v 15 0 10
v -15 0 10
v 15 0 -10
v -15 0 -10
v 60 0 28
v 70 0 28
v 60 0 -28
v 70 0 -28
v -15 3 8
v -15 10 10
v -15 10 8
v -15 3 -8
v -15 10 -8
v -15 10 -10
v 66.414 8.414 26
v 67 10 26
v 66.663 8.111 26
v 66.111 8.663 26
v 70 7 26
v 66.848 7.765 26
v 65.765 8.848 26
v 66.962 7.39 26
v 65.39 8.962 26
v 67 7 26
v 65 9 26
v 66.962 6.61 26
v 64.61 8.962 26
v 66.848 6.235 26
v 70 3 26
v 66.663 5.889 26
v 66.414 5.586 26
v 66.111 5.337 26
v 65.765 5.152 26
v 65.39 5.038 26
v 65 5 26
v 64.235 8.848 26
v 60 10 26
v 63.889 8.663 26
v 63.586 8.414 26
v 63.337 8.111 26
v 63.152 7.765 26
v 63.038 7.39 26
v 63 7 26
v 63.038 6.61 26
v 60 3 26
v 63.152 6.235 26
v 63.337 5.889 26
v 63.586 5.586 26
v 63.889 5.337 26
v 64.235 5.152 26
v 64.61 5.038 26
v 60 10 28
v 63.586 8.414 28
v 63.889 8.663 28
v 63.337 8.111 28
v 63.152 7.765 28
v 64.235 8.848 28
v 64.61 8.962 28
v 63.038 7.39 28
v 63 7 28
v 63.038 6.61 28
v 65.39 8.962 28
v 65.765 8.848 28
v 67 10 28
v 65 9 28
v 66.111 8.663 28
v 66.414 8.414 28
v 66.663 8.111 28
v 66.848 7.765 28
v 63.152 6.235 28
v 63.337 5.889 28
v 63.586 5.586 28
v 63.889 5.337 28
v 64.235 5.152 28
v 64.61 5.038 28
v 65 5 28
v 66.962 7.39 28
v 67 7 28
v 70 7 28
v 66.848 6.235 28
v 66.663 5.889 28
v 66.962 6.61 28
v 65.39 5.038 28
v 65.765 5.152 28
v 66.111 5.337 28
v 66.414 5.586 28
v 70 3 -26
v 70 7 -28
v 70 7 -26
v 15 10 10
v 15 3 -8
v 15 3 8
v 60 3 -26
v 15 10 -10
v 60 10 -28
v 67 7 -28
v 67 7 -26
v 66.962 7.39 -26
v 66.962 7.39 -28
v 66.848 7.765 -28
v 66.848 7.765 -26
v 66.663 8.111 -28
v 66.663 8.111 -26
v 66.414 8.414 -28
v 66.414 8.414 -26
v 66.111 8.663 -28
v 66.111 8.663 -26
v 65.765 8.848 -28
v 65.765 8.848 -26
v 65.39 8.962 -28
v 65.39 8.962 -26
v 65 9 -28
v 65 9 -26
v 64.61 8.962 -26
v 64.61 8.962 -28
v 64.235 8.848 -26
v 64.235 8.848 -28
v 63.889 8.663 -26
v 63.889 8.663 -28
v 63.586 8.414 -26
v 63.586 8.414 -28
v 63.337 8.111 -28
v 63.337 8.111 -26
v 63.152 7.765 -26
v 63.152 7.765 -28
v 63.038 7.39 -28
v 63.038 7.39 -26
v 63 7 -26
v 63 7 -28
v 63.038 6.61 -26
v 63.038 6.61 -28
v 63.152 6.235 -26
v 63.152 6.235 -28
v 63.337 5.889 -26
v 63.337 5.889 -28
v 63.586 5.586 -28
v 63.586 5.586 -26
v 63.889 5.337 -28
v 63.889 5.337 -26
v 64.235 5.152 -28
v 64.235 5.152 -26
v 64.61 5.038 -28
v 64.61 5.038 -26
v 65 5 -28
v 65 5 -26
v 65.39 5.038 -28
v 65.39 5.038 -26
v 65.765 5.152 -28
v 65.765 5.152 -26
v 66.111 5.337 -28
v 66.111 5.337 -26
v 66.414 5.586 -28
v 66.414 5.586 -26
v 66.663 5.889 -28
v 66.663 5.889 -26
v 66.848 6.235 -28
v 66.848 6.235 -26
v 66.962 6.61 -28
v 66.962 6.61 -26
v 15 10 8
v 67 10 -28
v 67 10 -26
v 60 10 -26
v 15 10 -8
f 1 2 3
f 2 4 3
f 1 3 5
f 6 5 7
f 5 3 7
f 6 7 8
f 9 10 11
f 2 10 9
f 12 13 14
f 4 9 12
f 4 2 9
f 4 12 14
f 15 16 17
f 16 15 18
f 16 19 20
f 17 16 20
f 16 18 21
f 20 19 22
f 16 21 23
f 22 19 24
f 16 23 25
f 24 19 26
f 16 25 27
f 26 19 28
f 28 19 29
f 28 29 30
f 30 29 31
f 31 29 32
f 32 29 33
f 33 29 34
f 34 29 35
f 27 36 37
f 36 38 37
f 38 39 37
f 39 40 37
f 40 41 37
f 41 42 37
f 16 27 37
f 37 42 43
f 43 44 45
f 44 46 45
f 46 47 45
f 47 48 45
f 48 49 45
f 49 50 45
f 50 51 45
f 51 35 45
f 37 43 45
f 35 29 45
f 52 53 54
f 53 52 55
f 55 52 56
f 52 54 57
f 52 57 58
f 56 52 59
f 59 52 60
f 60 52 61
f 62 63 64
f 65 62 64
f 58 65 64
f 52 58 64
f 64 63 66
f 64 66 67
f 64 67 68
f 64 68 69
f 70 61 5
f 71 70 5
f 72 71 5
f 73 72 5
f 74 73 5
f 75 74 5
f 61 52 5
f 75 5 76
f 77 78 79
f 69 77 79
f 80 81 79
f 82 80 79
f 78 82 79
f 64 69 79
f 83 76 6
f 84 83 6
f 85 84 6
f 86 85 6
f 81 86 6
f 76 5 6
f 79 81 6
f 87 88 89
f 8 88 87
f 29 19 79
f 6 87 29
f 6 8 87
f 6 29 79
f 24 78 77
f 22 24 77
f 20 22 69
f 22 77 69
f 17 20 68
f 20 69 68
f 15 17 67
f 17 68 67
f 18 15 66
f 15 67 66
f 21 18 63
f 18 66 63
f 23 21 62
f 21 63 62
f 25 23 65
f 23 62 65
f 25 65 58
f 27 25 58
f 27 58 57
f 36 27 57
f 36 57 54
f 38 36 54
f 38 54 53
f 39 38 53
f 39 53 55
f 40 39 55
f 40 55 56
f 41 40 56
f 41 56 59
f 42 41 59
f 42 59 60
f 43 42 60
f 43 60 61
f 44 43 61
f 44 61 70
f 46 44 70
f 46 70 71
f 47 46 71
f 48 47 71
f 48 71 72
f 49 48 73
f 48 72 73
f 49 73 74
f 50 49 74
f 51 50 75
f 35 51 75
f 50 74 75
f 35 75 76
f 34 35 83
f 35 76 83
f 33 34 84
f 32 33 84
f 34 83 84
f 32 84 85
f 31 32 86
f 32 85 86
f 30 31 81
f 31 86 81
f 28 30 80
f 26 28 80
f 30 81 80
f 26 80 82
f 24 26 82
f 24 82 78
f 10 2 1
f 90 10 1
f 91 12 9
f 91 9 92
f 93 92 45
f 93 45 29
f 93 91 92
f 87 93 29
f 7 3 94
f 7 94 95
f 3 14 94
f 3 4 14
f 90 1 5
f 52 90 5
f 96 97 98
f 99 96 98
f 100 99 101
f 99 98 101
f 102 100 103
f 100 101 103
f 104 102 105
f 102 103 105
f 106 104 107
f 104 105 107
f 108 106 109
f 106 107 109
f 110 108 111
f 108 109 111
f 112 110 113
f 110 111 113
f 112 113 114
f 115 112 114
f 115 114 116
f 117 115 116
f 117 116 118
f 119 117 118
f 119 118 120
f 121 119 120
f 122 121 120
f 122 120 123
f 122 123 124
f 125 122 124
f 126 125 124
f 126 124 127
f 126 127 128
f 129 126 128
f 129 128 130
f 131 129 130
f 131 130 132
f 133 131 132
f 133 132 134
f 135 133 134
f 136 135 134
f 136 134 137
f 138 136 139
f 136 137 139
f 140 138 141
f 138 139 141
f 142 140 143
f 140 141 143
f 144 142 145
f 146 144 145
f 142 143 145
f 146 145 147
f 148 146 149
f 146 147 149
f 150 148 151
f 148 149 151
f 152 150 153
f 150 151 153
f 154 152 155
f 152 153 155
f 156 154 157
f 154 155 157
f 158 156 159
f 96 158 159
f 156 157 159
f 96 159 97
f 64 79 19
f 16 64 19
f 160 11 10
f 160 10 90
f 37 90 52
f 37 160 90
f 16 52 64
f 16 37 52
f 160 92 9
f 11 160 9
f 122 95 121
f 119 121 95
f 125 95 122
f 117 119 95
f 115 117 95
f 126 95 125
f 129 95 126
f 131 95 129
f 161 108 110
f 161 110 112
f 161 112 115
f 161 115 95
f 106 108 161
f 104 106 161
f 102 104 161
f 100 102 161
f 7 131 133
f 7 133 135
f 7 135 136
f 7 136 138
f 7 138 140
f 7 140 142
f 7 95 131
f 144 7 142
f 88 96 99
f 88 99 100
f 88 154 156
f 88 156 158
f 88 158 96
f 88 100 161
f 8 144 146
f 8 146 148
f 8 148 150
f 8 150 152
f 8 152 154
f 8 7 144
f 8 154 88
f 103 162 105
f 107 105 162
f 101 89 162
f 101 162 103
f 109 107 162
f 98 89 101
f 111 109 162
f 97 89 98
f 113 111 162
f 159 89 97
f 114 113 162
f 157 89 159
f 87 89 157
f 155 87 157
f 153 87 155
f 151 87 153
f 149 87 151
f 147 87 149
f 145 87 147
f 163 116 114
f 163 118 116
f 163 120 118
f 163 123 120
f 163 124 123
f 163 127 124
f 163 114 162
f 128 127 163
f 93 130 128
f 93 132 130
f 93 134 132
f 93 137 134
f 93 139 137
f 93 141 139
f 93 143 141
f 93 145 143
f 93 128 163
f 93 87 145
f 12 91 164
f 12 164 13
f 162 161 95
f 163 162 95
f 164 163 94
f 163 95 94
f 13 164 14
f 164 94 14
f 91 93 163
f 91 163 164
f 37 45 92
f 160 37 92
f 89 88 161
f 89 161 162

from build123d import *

# Parameters (mm, degrees)
SALIENTE_EXTRUIR1_DEPTH = 3
SALIENTE_EXTRUIR2_DEPTH = 7
CROQUIS3_R              = 2
CORTAR_EXTRUIR1_DEPTH   = 91.19977827
CHAFL_N1_SIZE           = 3


with BuildPart() as part:
    # Croquis1 → Saliente-Extruir1 (new body)
    with BuildSketch(Plane(origin=(0, 0, 0), x_dir=(1, 0, 0), z_dir=(0, 1, 0))):
        Polygon((-15, -10), (15, -10), (60, -28), (70, -28), (70, 28), (60, 28), (15, 10), (-15, 10), align=None)
    extrude(amount=SALIENTE_EXTRUIR1_DEPTH)

    # Croquis2 → Saliente-Extruir2 (add)
    with BuildSketch(Plane(origin=(0, 3, 0), x_dir=(1, 0, 0), z_dir=(0, 1, 0))):
        Polygon((-15, 10), (15, 10), (60, 28), (70, 28), (70, 26), (60, 26), (15, 8), (-15, 8), align=None)
        Polygon((-15, -10), (15, -10), (60, -28), (70, -28), (70, -26), (60, -26), (15, -8), (-15, -8), align=None)
    extrude(amount=SALIENTE_EXTRUIR2_DEPTH)

    # Croquis3 → Cortar-Extruir1 (cut, through all)
    with BuildSketch(Plane.XY.offset(28)):
        with Locations((65, 7)):
            Circle(CROQUIS3_R)
    extrude(amount=-CORTAR_EXTRUIR1_DEPTH, mode=Mode.SUBTRACT)

    # Chaflán1
    chafl_n1_edges = [part.edges().sort_by_distance(p)[0] for p in [
        (70, 10, -27),
        (70, 10, 27),
    ]]
    chamfer(chafl_n1_edges, length=CHAFL_N1_SIZE)


solid = part.part
